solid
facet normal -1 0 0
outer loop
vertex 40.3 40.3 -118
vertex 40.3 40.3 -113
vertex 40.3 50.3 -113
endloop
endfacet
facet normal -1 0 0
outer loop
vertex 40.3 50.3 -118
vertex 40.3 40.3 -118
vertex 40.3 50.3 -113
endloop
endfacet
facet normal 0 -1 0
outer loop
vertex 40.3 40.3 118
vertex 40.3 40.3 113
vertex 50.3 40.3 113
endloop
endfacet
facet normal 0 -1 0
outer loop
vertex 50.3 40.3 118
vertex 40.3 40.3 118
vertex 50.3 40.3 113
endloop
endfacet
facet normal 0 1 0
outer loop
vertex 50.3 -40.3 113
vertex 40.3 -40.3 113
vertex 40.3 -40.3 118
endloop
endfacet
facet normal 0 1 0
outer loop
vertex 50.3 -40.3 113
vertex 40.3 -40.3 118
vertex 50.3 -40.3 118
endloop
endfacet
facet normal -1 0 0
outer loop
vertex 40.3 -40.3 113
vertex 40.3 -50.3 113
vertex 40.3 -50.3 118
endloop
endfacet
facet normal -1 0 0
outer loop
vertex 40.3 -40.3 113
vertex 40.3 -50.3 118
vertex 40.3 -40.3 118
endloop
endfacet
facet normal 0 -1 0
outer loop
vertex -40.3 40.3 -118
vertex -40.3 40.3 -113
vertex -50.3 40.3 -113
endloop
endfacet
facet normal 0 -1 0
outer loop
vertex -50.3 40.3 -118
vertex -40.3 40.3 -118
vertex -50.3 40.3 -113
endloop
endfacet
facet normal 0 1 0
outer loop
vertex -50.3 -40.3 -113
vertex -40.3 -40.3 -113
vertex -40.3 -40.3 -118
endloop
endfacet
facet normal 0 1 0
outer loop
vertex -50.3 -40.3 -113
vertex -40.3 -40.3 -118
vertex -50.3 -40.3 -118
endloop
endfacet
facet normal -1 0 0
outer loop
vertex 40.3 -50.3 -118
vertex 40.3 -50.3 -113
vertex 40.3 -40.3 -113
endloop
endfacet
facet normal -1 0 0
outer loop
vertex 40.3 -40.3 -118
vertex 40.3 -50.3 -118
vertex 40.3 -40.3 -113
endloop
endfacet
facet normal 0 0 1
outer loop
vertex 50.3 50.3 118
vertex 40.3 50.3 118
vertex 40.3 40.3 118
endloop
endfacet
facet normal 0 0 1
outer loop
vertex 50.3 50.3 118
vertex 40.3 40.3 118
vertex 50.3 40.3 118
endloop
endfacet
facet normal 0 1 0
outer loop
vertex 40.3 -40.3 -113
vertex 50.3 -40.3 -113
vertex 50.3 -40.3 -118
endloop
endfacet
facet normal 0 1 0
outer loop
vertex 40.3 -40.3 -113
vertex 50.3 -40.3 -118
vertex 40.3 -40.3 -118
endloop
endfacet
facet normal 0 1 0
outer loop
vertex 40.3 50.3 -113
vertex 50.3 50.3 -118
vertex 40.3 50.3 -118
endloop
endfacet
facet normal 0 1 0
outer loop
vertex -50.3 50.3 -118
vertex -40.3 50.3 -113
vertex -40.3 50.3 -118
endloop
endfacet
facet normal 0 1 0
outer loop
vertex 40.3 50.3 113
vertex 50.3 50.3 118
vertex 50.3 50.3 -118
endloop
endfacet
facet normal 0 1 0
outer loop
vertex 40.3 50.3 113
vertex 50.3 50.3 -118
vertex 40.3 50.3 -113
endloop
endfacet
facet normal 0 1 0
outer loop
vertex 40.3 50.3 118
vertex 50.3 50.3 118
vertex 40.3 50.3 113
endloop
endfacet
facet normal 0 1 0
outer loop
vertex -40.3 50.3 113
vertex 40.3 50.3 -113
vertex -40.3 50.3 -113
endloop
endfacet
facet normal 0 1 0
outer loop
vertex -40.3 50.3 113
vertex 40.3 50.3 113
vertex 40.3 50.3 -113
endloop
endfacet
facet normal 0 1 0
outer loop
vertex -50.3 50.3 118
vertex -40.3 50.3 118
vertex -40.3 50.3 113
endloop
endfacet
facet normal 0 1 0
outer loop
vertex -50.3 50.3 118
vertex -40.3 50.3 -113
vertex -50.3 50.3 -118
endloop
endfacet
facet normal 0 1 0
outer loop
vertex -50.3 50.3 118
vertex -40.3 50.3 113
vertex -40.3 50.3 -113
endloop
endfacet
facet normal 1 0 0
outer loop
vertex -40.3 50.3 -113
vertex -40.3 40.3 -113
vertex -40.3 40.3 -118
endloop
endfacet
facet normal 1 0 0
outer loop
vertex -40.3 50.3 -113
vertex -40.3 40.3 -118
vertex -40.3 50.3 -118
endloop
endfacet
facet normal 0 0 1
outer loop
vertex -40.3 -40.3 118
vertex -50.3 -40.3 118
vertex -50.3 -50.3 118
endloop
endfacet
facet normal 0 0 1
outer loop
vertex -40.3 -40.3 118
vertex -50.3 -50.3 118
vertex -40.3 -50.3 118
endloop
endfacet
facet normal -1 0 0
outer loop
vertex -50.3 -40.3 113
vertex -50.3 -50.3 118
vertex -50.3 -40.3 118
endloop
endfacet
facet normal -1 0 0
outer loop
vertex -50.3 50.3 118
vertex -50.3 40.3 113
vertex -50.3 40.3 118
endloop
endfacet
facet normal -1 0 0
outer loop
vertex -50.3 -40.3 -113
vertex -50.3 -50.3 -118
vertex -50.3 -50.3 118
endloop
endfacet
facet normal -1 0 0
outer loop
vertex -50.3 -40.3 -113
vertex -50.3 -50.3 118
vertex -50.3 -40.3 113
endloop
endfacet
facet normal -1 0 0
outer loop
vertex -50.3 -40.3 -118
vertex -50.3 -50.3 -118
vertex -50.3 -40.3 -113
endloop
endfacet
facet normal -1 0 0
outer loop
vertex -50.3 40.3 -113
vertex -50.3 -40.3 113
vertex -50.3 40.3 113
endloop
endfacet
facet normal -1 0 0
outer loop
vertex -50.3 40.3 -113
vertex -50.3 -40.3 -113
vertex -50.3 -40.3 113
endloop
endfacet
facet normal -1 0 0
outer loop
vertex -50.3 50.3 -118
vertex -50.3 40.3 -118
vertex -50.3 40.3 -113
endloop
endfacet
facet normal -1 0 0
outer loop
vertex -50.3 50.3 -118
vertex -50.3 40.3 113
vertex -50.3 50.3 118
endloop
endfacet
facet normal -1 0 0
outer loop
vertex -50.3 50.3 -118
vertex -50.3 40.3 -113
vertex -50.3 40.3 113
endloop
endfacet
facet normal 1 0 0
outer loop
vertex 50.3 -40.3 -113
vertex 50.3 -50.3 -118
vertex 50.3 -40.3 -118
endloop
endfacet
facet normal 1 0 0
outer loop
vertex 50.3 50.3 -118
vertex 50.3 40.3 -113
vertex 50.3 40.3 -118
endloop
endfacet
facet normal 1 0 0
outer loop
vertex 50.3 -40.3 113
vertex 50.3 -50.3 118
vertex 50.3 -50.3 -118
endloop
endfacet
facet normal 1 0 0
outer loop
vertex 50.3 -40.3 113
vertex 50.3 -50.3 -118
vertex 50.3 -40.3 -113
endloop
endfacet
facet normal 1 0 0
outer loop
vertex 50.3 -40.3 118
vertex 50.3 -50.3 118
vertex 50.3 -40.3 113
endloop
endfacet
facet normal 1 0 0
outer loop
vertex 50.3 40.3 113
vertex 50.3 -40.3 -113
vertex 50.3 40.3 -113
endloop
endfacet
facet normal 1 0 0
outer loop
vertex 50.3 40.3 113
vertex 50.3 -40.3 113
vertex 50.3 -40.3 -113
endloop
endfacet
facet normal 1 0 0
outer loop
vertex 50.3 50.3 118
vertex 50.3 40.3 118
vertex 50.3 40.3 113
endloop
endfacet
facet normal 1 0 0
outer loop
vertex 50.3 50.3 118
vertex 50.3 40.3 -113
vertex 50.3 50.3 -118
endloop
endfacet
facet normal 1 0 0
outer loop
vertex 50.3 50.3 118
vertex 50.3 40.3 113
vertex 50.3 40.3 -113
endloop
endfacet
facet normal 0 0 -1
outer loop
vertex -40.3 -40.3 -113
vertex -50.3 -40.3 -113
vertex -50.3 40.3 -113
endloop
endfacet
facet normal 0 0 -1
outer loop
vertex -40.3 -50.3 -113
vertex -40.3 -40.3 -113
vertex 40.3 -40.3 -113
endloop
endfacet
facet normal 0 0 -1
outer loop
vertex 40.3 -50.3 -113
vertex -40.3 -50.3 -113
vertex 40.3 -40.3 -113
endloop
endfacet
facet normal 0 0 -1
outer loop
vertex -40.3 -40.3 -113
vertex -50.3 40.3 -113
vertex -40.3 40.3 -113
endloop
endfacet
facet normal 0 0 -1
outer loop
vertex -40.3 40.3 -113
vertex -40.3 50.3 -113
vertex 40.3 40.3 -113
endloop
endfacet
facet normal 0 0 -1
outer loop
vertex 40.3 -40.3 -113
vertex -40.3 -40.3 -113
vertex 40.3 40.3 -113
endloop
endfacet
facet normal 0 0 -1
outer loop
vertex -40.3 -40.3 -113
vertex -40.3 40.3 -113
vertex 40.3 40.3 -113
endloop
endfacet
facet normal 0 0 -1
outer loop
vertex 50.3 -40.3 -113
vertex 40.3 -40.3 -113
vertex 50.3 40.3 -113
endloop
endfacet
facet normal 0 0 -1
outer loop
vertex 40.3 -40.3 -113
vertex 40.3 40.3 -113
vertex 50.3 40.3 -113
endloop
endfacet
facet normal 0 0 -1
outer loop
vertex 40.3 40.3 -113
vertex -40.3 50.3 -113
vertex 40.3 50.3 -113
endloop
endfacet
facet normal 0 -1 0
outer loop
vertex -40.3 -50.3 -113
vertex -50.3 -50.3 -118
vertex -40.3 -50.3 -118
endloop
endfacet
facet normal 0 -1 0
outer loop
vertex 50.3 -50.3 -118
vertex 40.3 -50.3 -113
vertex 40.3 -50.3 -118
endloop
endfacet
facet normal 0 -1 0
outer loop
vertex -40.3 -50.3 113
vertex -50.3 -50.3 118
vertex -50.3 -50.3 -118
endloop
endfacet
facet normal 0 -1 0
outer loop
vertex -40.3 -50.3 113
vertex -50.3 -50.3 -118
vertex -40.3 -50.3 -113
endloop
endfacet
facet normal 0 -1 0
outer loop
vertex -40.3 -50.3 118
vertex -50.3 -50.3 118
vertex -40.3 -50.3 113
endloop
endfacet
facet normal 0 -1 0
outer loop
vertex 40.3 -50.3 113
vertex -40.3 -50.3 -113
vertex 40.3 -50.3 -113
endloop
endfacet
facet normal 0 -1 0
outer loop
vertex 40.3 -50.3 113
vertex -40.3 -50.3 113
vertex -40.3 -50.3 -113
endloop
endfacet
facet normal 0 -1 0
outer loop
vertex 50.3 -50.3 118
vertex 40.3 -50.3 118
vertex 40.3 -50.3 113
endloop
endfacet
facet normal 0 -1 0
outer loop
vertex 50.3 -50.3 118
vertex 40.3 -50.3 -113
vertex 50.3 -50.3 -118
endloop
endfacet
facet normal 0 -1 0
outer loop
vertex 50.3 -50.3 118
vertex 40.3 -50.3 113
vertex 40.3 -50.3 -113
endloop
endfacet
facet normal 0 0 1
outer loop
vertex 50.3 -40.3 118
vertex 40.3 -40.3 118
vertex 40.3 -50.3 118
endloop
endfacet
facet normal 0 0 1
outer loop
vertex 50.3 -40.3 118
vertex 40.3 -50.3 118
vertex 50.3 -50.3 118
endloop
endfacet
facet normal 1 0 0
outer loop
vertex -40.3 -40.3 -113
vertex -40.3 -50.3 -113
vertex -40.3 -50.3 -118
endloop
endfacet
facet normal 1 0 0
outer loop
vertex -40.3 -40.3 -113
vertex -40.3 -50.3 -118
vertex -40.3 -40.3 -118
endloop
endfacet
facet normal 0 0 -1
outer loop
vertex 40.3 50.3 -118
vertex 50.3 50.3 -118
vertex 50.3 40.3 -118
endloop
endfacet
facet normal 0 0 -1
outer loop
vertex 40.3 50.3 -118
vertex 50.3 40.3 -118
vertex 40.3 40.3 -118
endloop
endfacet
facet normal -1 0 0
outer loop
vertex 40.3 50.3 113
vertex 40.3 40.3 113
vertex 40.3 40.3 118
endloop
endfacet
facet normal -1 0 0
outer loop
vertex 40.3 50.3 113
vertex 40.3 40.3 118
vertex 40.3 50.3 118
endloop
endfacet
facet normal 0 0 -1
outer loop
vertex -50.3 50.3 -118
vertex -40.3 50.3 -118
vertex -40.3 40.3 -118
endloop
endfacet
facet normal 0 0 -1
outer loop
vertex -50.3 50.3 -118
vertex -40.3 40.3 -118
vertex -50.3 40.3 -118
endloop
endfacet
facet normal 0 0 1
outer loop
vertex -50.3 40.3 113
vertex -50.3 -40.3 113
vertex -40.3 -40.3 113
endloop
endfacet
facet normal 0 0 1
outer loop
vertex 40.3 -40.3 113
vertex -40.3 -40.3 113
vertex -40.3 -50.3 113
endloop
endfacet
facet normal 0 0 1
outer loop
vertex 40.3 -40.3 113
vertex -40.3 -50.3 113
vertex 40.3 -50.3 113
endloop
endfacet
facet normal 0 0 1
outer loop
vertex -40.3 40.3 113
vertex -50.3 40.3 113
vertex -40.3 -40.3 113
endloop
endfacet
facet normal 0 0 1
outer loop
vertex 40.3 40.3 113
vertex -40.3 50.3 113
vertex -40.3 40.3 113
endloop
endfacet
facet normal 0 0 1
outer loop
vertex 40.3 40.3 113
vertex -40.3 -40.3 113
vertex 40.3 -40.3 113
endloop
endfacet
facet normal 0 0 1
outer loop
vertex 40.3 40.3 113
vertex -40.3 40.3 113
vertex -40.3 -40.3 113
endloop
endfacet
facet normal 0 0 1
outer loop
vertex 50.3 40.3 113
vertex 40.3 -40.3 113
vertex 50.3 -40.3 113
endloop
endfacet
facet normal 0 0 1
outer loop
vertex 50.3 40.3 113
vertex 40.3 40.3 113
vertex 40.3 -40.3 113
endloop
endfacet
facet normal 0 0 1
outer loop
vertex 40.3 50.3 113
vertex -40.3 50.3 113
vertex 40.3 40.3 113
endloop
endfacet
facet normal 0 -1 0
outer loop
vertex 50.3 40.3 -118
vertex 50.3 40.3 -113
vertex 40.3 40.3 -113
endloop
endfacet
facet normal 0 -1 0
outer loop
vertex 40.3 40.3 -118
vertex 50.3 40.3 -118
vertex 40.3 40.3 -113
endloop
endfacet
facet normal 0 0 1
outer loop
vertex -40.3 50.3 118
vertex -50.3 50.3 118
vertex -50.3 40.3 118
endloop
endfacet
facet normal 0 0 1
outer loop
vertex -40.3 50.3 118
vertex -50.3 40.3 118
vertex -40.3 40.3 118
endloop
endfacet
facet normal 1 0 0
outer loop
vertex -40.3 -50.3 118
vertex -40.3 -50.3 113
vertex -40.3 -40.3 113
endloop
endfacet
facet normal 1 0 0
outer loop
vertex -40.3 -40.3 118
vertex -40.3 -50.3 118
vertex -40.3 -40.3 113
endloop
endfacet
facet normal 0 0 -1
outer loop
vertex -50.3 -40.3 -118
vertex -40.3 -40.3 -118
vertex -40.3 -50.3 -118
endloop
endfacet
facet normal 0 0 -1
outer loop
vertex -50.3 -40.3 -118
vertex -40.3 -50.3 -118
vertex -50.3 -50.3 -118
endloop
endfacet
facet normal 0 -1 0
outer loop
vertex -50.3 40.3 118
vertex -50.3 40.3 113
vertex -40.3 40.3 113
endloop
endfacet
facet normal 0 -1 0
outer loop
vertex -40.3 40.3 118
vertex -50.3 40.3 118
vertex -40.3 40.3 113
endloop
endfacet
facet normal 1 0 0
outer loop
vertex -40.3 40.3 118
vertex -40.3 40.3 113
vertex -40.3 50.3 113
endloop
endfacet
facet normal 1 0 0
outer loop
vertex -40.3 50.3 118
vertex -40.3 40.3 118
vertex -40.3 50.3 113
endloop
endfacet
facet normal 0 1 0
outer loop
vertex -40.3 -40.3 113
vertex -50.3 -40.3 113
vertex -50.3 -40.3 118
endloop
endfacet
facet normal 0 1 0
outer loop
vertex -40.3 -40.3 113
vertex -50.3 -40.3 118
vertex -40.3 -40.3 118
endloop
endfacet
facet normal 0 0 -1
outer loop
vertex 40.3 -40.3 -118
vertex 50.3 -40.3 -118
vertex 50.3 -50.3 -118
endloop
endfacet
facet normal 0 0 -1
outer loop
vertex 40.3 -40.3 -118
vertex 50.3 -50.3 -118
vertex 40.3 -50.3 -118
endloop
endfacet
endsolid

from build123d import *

# Parameters (mm, degrees)
SKETCH1_W           = 100.6
SKETCH1_H           = 100.6
BOSS_EXTRUDE1_DEPTH = 113
SKETCH2_W           = 10
SKETCH2_H           = 10
BOSS_EXTRUDE2_DEPTH = 5
SKETCH3_W           = 10
SKETCH3_H           = 10
BOSS_EXTRUDE3_DEPTH = 5


with BuildPart() as part:
    # Sketch1 → Boss-Extrude1 (new, symmetric)
    with BuildSketch(Plane.XY):
        Rectangle(SKETCH1_W, SKETCH1_H)
    extrude(amount=BOSS_EXTRUDE1_DEPTH, both=True)

    # Sketch2 → Boss-Extrude2 (add)
    with BuildSketch(Plane.XY.offset(113)):
        with Locations((-45.3, 45.3)):
            Rectangle(SKETCH2_W, SKETCH2_H)
        with Locations((45.3, 45.3)):
            Rectangle(SKETCH2_W, SKETCH2_H)
        with Locations((45.3, -45.3)):
            Rectangle(SKETCH2_W, SKETCH2_H)
        with Locations((-45.3, -45.3)):
            Rectangle(SKETCH2_W, SKETCH2_H)
    extrude(amount=BOSS_EXTRUDE2_DEPTH)

    # Sketch3 → Boss-Extrude3 (add)
    with BuildSketch(Plane(origin=(0, 0, -113), x_dir=(-1, 0, 0), z_dir=(0, 0, -1))):
        with Locations((-45.3, 45.3)):
            Rectangle(SKETCH3_W, SKETCH3_H)
        with Locations((45.3, 45.3)):
            Rectangle(SKETCH3_W, SKETCH3_H)
        with Locations((45.3, -45.3)):
            Rectangle(SKETCH3_W, SKETCH3_H)
        with Locations((-45.3, -45.3)):
            Rectangle(SKETCH3_W, SKETCH3_H)
    extrude(amount=BOSS_EXTRUDE3_DEPTH)


solid = part.part
